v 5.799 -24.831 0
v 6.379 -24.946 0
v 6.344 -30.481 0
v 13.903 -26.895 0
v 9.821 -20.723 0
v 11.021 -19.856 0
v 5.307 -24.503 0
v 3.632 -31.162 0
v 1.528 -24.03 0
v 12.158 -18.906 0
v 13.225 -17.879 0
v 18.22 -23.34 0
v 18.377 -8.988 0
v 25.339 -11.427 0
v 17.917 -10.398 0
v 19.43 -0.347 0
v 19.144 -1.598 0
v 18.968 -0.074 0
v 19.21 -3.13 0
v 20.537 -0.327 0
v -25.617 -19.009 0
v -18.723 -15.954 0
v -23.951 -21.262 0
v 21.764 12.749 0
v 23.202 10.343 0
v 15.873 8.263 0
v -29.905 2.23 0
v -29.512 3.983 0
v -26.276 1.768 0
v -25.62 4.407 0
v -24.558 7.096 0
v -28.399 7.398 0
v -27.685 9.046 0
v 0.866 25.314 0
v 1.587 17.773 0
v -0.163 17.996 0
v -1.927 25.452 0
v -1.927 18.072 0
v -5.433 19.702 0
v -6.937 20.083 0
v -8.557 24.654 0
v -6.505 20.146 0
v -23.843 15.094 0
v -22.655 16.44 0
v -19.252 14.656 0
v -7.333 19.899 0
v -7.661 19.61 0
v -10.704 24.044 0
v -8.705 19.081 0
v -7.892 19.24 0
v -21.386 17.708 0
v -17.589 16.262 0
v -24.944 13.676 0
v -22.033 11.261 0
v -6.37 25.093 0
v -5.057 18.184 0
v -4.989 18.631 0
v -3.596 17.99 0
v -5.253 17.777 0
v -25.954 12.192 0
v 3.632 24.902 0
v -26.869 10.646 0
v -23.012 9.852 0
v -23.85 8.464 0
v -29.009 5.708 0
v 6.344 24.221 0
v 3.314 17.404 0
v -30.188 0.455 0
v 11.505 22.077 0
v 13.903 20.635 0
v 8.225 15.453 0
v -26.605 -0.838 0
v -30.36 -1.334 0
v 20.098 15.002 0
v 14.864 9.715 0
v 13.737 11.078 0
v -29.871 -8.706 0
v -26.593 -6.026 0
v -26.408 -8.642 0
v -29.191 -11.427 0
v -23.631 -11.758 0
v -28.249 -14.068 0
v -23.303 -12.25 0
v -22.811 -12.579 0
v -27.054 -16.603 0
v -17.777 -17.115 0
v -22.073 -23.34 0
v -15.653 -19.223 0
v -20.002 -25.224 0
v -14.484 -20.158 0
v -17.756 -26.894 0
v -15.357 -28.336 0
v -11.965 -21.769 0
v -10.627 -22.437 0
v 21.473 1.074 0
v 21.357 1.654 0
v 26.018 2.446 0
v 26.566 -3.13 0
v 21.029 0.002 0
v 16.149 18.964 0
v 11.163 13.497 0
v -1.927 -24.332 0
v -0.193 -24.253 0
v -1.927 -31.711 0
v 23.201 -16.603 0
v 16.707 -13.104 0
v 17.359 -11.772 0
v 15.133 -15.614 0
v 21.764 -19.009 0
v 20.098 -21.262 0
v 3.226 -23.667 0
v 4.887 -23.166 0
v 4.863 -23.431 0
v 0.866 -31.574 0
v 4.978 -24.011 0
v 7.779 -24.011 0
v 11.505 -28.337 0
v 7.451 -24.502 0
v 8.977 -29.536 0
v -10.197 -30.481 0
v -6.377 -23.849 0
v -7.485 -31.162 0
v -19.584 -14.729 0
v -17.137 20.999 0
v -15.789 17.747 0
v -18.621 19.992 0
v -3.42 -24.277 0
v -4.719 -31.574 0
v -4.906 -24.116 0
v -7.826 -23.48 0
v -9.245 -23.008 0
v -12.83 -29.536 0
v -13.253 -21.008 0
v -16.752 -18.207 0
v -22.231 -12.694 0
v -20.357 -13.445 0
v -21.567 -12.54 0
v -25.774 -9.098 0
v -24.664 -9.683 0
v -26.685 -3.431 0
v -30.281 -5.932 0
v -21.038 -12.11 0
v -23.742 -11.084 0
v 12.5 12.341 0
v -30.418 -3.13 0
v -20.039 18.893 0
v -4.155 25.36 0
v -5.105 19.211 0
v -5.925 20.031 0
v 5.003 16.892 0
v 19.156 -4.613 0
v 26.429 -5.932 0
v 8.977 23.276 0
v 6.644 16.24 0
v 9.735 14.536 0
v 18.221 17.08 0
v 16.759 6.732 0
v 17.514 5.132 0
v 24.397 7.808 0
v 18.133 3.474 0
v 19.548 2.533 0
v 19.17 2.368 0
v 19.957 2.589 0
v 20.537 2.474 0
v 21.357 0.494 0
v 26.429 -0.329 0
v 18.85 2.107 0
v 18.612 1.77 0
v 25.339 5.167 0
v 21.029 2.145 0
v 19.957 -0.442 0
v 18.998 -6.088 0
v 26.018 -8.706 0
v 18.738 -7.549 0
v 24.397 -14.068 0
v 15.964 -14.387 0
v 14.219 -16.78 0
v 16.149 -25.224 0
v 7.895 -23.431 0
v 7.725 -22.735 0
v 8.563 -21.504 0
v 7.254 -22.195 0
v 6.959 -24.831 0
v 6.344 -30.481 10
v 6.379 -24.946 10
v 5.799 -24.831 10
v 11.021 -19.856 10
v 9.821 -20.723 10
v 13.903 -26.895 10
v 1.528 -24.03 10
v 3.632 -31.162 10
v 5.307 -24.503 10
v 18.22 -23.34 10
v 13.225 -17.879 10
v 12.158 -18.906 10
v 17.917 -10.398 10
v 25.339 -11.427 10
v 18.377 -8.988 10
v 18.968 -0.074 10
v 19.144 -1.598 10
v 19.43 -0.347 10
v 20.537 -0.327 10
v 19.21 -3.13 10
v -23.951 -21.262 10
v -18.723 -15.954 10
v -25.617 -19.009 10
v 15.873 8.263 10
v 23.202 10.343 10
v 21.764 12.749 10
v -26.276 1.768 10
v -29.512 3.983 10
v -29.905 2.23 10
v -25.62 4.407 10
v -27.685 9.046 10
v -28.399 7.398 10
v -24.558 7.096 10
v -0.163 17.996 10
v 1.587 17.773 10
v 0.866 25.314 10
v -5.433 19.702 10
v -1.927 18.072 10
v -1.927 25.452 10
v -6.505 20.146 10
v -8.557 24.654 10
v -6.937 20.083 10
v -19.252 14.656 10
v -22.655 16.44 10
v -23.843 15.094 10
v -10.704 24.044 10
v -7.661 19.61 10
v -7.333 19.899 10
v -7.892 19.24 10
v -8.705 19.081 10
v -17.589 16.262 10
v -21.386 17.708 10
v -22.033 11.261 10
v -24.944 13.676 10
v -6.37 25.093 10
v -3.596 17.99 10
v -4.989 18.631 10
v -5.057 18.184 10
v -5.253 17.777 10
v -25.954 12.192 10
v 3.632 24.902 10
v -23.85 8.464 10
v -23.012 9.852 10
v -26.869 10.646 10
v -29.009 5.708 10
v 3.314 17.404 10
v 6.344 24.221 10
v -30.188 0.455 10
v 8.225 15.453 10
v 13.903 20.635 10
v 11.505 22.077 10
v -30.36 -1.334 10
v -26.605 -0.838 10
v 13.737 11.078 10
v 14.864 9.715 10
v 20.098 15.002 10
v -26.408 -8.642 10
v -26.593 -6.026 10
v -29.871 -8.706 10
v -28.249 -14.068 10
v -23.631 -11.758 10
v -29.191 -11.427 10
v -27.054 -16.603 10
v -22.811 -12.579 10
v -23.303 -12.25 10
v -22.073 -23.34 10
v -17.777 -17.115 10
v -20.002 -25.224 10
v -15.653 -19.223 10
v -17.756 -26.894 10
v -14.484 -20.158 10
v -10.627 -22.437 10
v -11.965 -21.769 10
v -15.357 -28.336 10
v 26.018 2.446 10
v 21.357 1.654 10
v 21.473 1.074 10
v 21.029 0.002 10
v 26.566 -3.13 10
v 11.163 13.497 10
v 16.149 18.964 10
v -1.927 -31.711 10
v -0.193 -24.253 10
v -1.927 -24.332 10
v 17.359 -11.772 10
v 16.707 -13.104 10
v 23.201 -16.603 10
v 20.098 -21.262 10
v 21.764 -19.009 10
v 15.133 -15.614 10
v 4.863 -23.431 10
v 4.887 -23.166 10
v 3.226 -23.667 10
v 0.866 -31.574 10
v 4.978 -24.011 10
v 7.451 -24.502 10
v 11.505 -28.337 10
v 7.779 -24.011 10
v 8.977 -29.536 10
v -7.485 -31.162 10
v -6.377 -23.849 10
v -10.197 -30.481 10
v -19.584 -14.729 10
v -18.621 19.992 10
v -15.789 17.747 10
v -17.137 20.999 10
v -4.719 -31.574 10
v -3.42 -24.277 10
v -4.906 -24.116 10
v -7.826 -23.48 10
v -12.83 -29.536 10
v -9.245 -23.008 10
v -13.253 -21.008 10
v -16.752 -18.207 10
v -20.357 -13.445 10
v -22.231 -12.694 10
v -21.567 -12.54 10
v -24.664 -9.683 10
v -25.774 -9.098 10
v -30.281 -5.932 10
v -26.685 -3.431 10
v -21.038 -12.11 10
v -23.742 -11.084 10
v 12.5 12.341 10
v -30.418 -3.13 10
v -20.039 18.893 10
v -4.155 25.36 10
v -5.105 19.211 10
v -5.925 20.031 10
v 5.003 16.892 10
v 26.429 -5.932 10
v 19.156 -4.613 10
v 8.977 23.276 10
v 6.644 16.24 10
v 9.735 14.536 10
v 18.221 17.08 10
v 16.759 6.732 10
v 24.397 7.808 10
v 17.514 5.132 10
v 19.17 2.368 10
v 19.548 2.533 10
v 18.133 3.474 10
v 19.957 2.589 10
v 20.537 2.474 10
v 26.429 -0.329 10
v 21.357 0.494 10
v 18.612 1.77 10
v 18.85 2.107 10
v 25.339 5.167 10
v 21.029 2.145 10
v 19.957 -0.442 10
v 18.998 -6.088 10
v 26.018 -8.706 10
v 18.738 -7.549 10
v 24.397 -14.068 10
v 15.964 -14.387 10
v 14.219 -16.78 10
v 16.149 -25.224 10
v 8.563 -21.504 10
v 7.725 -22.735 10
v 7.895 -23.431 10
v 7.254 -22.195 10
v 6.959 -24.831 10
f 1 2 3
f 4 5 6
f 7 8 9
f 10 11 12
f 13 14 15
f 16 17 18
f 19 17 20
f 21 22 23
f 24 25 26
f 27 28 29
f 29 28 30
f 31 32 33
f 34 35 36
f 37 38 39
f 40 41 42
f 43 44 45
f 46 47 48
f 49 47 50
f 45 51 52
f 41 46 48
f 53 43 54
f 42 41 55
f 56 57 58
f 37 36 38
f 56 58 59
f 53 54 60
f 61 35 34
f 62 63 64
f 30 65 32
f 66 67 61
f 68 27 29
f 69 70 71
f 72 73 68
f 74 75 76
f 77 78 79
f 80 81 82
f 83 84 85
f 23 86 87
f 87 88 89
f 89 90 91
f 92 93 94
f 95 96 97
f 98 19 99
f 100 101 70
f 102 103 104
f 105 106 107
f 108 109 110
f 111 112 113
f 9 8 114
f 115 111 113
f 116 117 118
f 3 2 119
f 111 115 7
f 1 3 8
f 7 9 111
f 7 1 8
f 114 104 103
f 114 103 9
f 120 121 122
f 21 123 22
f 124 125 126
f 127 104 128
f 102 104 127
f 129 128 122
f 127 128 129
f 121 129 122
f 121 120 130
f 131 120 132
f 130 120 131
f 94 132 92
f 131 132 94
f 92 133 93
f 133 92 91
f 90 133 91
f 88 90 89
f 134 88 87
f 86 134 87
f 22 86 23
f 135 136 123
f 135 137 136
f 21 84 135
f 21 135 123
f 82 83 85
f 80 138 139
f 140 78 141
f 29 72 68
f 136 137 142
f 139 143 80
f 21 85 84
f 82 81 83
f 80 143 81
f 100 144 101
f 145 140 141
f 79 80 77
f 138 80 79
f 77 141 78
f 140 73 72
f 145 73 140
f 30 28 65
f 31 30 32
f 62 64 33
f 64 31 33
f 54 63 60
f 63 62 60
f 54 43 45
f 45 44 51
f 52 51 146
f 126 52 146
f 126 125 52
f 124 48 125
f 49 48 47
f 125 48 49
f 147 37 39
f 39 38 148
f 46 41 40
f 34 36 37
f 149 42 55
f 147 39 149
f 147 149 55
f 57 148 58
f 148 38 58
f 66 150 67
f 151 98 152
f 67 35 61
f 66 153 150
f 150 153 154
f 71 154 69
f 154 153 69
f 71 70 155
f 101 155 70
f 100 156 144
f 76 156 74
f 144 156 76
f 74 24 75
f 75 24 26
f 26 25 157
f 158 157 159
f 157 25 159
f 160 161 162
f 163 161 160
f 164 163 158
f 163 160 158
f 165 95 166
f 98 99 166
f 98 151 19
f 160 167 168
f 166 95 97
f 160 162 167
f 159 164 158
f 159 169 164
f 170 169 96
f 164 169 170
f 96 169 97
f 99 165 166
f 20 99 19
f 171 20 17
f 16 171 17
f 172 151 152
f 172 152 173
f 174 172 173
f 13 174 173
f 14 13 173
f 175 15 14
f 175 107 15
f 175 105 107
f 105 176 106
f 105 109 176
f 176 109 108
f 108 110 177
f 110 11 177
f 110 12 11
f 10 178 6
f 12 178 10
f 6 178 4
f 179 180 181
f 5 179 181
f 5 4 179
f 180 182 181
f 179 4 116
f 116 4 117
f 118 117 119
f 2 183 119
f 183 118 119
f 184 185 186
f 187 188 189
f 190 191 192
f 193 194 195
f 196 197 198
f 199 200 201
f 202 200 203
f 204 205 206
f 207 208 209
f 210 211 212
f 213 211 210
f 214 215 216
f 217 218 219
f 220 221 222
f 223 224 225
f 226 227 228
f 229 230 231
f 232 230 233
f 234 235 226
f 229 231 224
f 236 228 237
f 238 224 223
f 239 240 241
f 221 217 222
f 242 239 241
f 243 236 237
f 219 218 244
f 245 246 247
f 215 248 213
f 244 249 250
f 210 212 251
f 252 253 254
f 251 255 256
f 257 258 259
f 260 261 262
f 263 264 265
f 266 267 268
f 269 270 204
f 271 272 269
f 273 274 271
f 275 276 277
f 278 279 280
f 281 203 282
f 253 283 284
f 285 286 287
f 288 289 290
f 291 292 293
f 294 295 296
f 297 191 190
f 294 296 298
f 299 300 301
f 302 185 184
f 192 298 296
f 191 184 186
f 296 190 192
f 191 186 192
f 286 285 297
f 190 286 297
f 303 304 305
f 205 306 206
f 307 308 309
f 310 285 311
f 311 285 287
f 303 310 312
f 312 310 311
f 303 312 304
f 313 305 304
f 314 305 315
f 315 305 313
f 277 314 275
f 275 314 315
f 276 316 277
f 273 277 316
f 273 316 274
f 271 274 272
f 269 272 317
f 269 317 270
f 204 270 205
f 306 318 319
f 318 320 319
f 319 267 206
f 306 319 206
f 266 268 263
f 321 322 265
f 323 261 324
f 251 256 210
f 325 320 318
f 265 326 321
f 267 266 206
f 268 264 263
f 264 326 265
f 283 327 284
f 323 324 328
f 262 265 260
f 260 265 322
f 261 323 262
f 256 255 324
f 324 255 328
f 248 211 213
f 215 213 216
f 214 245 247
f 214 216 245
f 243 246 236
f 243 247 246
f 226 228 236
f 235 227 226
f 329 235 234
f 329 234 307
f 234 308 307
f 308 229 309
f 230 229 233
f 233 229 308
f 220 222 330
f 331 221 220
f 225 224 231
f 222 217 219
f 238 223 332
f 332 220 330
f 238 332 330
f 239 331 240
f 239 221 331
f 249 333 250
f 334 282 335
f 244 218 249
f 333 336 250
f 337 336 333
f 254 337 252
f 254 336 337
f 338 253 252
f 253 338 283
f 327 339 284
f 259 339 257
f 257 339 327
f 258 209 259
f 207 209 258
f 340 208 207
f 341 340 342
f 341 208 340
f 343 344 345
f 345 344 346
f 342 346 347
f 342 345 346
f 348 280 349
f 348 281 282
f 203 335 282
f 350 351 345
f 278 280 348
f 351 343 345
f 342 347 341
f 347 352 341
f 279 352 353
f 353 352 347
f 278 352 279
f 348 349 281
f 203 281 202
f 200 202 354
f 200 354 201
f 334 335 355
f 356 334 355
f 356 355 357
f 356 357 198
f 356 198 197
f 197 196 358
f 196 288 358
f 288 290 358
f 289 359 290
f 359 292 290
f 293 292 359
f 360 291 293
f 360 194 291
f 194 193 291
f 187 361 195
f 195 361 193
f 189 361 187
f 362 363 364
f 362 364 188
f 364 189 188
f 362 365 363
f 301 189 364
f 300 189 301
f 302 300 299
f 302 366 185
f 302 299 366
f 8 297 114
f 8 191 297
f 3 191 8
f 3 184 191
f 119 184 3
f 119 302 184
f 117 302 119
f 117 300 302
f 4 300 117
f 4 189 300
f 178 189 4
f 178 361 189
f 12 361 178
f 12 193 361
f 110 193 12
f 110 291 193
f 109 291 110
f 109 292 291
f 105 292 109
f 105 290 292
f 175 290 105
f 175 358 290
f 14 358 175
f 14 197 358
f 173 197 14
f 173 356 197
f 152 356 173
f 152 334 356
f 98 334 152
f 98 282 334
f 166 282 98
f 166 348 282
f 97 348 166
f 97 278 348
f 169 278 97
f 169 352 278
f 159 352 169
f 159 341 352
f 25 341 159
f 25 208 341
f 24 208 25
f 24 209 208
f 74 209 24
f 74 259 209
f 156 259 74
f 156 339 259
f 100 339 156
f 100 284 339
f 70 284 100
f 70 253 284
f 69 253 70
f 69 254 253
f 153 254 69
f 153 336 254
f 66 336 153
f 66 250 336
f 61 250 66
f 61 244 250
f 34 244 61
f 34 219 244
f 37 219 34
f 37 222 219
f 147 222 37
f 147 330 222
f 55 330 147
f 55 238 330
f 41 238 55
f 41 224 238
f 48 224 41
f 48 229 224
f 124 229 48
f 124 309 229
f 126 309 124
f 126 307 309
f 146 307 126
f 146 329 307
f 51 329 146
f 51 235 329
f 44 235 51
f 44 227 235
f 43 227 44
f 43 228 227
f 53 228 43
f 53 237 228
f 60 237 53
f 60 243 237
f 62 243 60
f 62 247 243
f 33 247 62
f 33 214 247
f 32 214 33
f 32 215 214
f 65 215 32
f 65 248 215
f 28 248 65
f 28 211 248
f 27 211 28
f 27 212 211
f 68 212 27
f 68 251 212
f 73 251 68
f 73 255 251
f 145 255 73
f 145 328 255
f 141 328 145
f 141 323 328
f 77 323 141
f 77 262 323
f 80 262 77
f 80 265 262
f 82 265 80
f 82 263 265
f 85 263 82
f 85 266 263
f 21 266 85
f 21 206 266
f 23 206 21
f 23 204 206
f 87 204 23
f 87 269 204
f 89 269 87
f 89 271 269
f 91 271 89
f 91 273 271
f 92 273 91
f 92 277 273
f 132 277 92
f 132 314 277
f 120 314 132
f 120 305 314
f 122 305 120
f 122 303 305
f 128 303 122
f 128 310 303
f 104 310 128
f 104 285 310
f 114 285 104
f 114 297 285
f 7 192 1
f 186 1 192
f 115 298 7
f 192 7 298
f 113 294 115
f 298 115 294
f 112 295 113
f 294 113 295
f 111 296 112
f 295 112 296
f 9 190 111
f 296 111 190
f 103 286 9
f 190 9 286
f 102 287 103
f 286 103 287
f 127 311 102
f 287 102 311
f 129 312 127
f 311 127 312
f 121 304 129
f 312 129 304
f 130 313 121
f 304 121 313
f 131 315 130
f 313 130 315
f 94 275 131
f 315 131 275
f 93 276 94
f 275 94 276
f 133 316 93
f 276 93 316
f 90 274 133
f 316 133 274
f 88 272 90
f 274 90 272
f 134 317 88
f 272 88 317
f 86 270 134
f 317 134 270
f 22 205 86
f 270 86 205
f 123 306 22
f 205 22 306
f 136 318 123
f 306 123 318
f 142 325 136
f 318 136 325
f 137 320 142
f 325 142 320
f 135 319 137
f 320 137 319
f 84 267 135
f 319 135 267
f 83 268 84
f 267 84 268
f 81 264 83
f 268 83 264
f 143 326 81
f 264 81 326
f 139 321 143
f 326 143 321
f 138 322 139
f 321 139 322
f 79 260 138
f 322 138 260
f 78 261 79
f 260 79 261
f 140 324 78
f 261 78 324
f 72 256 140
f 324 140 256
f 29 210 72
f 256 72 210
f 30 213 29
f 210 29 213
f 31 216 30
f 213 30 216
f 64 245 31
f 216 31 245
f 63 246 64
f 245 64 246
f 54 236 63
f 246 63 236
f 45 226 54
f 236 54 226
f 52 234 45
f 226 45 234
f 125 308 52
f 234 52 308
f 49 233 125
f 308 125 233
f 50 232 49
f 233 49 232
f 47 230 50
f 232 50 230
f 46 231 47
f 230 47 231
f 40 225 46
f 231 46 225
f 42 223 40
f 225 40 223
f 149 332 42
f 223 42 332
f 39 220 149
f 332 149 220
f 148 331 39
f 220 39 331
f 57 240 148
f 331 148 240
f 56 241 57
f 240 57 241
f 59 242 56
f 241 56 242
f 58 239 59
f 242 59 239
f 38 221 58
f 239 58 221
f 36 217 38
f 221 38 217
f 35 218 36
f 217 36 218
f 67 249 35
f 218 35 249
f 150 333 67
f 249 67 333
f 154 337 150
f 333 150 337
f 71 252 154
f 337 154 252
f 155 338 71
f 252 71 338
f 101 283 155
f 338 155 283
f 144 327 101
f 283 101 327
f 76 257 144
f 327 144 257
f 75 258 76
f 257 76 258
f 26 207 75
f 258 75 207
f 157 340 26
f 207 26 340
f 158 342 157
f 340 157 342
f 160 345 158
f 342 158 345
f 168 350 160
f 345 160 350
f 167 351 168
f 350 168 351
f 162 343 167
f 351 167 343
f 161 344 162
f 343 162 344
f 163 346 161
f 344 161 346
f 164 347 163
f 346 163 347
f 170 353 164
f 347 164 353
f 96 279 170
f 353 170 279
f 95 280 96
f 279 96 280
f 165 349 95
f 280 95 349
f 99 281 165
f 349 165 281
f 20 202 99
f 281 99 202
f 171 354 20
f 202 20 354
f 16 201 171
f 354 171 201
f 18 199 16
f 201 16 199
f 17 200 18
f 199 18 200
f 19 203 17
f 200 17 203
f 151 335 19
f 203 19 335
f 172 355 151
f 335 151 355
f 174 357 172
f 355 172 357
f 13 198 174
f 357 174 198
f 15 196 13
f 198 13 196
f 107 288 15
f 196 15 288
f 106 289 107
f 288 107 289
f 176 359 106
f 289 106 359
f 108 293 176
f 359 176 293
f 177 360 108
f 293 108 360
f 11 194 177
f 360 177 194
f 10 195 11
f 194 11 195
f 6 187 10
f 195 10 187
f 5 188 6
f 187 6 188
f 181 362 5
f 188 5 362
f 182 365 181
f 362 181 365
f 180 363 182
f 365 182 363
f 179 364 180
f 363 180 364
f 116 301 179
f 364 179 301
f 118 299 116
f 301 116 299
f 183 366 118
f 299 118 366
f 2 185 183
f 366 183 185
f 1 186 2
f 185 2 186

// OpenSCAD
height_shim = 10.000000000;

center_shim_1 = [-1.926290986,-3.129920167];
size_shim_1 = [56.984115807,57.162917324];
stroke_width_shim_1 = 0.263352320;
// paths for shim_1
points_shim_1_1 = [ [-0.000259292,28.581458662],[-2.229081249,28.489718778],[-4.443917753,28.223348693],[-6.631192720,27.783981150],[-8.777499009,27.174309302],[-15.210699768,24.128500173],[-16.694843258,23.121715417],[-18.112972878,22.023348963],[-19.459481138,20.837743911],[-20.729043744,19.569588319],[-21.916640660,18.223896659],[-23.017575955,16.805989993],[-24.027496368,15.321474933],[-24.942408526,13.776221469],[-25.758694732,12.176339760],[-26.473127271,10.528155972],[-27.082881172,8.838187266],[-27.585545378,7.113116026],[-27.979132281,5.359763437],[-28.262085582,3.585062512],[-28.433286440,1.796030678],[-28.492057903,-0.000257969],[-28.354844064,-2.801693768],[-27.944563256,-5.576148861],[-27.265166622,-8.296904313],[-26.323196980,-10.937758332],[-25.127725814,-13.473278607],[-23.690265915,-15.879047224],[-22.024660504,-18.131895821],[-20.146949922,-20.210128709],[-18.075217154,-22.093731806],[-15.829413683,-23.764565380],[-13.431167352,-25.206538742],[-10.903574081,-26.405765204],[-8.270975443,-27.350695810],[-5.558724248,-28.032230561],[-2.792940388,-28.443806049],[-0.000259292,-28.581458662],[2.792456557,-28.443853851],[5.558279206,-28.032319362],[8.270572236,-27.350818504],[10.903214749,-26.405914509],[13.430852924,-25.206707334],[15.829144191,-23.764746012],[18.074991663,-22.093917440],[20.146766574,-20.210312630],[22.024516572,-18.132071751],[23.690157873,-15.879209425],[25.127649420,-13.473421977],[26.323147366,-10.937878485],[27.265138395,-8.296997652],[27.944550609,-5.576212638],[28.354840887,-2.801726124],[28.492057903,-0.000257969],[28.354888149,2.801244762],[27.944638407,5.575769867],[27.265259703,8.296596504],[26.323294984,10.937520987],[25.127816106,13.473109154],[23.690336464,15.878941309],[22.024700108,18.131847413],[20.146948417,20.210130220],[18.075165605,22.093774244],[15.829304559,23.764638524],[13.430994673,25.206631331],[10.903333543,26.405865150],[8.270664520,27.350790423],[5.558342261,28.032306781],[2.792488547,28.443850691],[-0.000259292,28.581458662] ];
points_shim_1_2 = [ [-4.578789126,23.276356665],[-3.998776227,23.160967826],[-3.507065558,22.832410129],[-3.178508712,22.340698897],[-3.063120882,21.760685809],[-3.130488922,21.313709606],[-3.326669690,20.906475906],[-1.669293112,21.120274157],[-0.000259292,21.202063102],[1.762986824,21.126052251],[3.513764304,20.902741144],[5.239866050,20.533686790],[6.929257012,20.021462381],[8.570158102,19.369639342],[10.151128324,18.582762438],[11.661144539,17.666318077],[13.089678331,16.626696066],[14.426769409,15.471145051],[15.663095056,14.207721981],[16.790035130,12.845235932],[17.799732170,11.393186683],[18.685146177,9.861698484],[19.440103701,8.261449464],[20.059340886,6.603597178],[20.538540172,4.899700815],[20.776208444,5.237062548],[21.096063470,5.497815134],[21.474395622,5.662629979],[21.883160585,5.719289991],[22.463173484,5.603901151],[22.954884153,5.275343454],[23.283440999,4.783632222],[23.398828828,4.203619134],[23.283440999,3.623606047],[22.954884153,3.131894815],[22.463173484,2.803337118],[21.883160585,2.687948278],[21.355836107,2.783147757],[20.894589957,3.055885784],[21.070391508,1.532195153],[21.135919057,-0.000257969],[21.081848921,-1.482990197],[20.924537848,-2.958298516],[20.664756212,-4.418958141],[20.303776199,-5.857816026],[19.843365576,-7.267825888],[19.285779036,-8.642082720],[18.633747156,-9.973856600],[17.890463024,-11.256625651],[17.059566603,-12.484107981],[16.145126904,-13.650292443],[15.151622063,-14.749468073],[14.083917406,-15.776252061],[12.947241627,-16.725616107],[11.747161182,-17.592911048],[10.489553025,-18.373889621],[9.180575835,-19.064727271],[9.651011404,-19.604924644],[9.820846323,-20.300826159],[9.705458493,-20.880839246],[9.376901648,-21.372550479],[8.885190978,-21.701108176],[8.305178080,-21.816497015],[7.725005929,-21.701257039],[7.233119266,-21.372733855],[6.904428683,-20.880959042],[6.788991253,-20.300826159],[6.813795940,-20.035726899],[5.151931098,-20.537338513],[3.454644645,-20.900492096],[1.733379616,-21.122739280],[-0.000259292,-21.202581686],[-1.493968051,-21.147042644],[-2.980028583,-20.985742790],[-4.451008659,-20.719488830],[-5.899551476,-20.349612380],[-7.318412443,-19.877963300],[-8.700495419,-19.306900447],[-10.038888199,-18.639279874],[-11.326897088,-17.878440549],[-12.558080372,-17.028187652],[-13.726280542,-16.092773550],[-14.825655083,-15.076876524],[-15.850705701,-13.985577375],[-16.796305815,-12.824334010],[-17.657726200,-11.598954151],[-18.430658639,-10.315566283],[-19.111237468,-8.980589006],[-19.640460540,-9.410243557],[-20.304444780,-9.564532337],[-20.884577676,-9.449094910],[-21.376352499,-9.120404334],[-21.704875691,-8.628517681],[-21.815464295,-7.953778172],[-22.737370507,-6.553346582],[-23.848182602,-5.968467288],[-24.481450892,-5.512584270],[-24.481450892,-5.512584270],[-24.666637301,-2.896028690],[-24.758557033,-0.300607293],[-24.679110731,2.291465534],[-24.350199041,4.897975401],[-23.693722606,7.536707920],[-22.631582072,10.225448703],[-21.923981719,11.594130197],[-21.085678083,12.981983361],[-20.106908744,14.391231396],[-17.326024793,17.785854354],[-15.662318374,19.392361461],[-13.862462500,20.876503907],[-6.778656628,22.210787020],[-5.965785205,22.369433827],[-5.734531606,22.739999746],[-5.407204891,23.029230714],[-5.010989030,23.213106554],[-4.578789126,23.276356665] ];

module polygon_shim_1() {
 render(convexity=4) {
    difference() {
      polygon(points=points_shim_1_1);
      polygon(points=points_shim_1_2);
    }
 }
}

linear_extrude(height=height_shim) translate(center_shim_1) polygon_shim_1();
